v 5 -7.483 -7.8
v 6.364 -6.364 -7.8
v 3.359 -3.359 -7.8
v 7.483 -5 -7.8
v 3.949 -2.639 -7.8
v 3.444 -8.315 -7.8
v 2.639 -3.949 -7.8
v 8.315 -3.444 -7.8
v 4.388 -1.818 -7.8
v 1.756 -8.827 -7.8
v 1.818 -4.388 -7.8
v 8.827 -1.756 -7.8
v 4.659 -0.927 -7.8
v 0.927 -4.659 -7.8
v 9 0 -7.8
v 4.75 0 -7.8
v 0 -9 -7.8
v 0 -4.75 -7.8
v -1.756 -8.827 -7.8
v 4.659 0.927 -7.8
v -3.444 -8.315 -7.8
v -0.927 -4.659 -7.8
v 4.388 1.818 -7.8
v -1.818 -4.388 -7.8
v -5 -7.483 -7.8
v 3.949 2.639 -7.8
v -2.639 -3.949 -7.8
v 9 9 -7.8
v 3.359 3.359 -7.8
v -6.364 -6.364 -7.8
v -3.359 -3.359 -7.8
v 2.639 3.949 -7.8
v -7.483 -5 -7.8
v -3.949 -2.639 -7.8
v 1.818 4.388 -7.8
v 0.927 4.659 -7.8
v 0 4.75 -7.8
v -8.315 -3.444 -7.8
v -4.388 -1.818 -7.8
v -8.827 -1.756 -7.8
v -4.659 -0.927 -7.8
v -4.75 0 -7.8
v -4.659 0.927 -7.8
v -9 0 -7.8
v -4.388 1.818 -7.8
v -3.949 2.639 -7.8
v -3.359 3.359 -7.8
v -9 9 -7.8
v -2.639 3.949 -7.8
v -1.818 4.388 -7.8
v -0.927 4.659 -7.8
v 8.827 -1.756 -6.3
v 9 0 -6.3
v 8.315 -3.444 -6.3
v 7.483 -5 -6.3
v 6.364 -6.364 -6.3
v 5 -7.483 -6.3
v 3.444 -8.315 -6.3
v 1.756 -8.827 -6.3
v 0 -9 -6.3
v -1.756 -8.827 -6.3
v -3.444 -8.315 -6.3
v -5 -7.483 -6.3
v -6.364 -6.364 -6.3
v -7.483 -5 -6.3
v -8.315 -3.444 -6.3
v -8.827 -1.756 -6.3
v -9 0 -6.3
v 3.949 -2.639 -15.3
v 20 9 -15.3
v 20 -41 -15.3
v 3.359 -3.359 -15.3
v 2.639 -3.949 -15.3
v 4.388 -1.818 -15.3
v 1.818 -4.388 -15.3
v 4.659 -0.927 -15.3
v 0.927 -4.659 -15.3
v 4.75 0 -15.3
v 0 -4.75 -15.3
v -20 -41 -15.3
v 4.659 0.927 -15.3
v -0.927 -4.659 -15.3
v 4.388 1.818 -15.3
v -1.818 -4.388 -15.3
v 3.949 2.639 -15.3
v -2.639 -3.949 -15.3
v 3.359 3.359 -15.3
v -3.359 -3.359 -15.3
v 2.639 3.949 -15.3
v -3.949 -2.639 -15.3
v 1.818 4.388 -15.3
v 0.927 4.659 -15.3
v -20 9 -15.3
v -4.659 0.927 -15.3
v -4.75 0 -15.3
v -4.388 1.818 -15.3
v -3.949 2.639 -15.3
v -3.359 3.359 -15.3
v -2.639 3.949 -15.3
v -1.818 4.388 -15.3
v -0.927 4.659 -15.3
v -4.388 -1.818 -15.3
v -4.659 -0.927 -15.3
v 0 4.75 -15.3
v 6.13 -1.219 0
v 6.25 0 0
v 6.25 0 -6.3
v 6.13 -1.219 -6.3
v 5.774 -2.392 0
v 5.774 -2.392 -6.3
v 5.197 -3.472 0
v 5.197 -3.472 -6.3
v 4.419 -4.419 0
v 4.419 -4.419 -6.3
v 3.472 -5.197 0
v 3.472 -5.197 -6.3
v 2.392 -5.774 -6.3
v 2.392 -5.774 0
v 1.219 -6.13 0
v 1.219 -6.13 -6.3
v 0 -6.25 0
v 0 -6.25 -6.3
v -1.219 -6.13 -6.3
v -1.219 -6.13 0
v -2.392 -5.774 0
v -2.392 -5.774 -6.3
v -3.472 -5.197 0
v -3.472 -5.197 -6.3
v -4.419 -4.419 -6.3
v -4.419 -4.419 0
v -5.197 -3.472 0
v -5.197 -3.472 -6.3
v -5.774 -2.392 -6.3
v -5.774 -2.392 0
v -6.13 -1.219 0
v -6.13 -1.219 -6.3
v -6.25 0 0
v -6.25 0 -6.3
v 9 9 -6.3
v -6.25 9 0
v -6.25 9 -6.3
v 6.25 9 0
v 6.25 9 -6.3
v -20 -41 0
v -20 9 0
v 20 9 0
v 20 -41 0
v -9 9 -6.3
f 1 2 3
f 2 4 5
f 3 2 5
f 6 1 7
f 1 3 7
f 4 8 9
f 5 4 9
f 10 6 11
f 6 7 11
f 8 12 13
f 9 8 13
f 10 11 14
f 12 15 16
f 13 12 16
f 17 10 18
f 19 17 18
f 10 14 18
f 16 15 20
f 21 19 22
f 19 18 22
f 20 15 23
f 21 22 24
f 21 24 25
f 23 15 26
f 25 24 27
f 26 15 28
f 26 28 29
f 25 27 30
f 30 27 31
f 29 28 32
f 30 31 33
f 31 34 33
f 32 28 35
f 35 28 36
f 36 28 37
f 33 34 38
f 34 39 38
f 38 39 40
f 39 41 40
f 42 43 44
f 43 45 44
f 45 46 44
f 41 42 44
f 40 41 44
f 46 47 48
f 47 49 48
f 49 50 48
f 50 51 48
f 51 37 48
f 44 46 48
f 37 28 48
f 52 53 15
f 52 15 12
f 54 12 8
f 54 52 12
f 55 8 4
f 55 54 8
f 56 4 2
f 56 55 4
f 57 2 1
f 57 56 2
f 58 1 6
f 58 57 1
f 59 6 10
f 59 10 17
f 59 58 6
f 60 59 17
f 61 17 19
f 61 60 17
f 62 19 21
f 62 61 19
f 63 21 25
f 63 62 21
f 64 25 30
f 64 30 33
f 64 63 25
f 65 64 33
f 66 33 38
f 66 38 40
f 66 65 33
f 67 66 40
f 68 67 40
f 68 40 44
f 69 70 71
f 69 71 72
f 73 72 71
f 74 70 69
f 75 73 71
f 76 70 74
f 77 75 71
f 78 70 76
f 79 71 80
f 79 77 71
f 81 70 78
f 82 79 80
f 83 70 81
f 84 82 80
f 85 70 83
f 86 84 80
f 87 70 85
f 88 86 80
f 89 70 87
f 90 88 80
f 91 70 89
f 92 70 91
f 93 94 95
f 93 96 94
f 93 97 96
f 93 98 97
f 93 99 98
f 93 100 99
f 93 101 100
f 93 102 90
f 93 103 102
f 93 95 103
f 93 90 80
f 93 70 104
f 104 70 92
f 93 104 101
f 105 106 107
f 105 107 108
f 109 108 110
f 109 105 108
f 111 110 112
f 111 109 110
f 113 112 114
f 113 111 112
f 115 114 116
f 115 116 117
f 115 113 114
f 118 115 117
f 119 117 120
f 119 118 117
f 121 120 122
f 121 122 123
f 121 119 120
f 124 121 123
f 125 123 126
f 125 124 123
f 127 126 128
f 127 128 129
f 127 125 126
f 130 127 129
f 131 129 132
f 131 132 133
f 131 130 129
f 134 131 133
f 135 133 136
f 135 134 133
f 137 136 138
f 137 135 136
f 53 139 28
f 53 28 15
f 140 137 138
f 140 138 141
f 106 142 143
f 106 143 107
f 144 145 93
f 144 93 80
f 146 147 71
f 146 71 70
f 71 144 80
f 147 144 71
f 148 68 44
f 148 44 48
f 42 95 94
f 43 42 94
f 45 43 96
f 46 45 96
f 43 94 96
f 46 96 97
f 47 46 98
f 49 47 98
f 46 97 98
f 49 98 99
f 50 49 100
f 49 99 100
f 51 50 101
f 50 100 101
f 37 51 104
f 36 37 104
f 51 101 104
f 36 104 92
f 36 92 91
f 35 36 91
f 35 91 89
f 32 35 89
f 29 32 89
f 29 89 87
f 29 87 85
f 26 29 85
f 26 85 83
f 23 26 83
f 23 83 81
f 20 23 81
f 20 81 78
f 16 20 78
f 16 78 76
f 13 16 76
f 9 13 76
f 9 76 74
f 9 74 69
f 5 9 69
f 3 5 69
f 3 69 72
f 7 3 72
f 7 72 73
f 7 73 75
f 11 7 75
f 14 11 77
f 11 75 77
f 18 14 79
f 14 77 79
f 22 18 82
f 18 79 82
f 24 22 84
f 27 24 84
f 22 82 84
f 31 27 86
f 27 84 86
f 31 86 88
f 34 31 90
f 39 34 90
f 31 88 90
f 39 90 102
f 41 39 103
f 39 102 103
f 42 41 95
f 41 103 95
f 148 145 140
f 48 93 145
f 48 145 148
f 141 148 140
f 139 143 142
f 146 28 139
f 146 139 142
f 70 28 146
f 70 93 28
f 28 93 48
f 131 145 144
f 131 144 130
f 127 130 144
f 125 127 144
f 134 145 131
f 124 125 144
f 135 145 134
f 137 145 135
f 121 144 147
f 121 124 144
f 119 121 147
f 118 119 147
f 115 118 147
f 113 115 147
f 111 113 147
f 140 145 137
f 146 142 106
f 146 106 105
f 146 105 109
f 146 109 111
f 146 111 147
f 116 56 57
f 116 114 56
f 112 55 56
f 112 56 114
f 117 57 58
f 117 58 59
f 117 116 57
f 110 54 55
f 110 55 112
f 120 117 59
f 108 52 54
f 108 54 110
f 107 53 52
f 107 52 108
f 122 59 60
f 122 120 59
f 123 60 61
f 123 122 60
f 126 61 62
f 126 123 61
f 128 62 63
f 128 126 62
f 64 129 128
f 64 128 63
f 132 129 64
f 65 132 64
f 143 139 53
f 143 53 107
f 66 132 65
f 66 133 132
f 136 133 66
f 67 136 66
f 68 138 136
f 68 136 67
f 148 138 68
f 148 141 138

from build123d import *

# Parameters (mm, degrees)
BOSS_EXTRUDE1_DEPTH = 15.3
SKETCH3_R           = 4.75
BOSS_EXTRUDE2_DEPTH = 9
CUT_EXTRUDE1_DEPTH  = 1.5


with BuildPart() as part:
    # Sketch2 → Boss-Extrude1 (new body)
    with BuildSketch(Plane.XY):
        with BuildLine():
            Line((-20, 9), (-20, -41))
            Line((-20, -41), (20, -41))
            Line((20, -41), (20, 9))
            Line((20, 9), (6.25, 9))
            Line((6.25, 9), (6.25, 0))
            ThreePointArc((6.25, 0), (0, -6.25), (-6.25, 0))
            Line((-6.25, 0), (-6.25, 9))
            Line((-6.25, 9), (-20, 9))
        make_face()
    extrude(amount=-BOSS_EXTRUDE1_DEPTH)

    # Sketch3 → Boss-Extrude2 (add)
    with BuildSketch(Plane(origin=(0, 0, -15.3), x_dir=(-1, 0, 0), z_dir=(0, 0, -1))):
        with BuildLine():
            Line((6.25, 0), (6.25, 9))
            Line((6.25, 9), (-6.25, 9))
            Line((-6.25, 9), (-6.25, 0))
            ThreePointArc((-6.25, 0), (0, -6.25), (6.25, 0))
        make_face()
        Circle(SKETCH3_R, mode=Mode.SUBTRACT)
    extrude(amount=-BOSS_EXTRUDE2_DEPTH)

    # Sketch4 → Cut-Extrude1 (cut)
    with BuildSketch(Plane.XY.offset(-6.3)):
        with BuildLine():
            Line((-9, 0), (-9, 9))
            ThreePointArc((-9, 9), (0, 18), (9, 9))
            Line((9, 9), (9, 0))
            ThreePointArc((9, 0), (0, -9), (-9, 0))
        make_face()
    extrude(amount=-CUT_EXTRUDE1_DEPTH, mode=Mode.SUBTRACT)


solid = part.part
